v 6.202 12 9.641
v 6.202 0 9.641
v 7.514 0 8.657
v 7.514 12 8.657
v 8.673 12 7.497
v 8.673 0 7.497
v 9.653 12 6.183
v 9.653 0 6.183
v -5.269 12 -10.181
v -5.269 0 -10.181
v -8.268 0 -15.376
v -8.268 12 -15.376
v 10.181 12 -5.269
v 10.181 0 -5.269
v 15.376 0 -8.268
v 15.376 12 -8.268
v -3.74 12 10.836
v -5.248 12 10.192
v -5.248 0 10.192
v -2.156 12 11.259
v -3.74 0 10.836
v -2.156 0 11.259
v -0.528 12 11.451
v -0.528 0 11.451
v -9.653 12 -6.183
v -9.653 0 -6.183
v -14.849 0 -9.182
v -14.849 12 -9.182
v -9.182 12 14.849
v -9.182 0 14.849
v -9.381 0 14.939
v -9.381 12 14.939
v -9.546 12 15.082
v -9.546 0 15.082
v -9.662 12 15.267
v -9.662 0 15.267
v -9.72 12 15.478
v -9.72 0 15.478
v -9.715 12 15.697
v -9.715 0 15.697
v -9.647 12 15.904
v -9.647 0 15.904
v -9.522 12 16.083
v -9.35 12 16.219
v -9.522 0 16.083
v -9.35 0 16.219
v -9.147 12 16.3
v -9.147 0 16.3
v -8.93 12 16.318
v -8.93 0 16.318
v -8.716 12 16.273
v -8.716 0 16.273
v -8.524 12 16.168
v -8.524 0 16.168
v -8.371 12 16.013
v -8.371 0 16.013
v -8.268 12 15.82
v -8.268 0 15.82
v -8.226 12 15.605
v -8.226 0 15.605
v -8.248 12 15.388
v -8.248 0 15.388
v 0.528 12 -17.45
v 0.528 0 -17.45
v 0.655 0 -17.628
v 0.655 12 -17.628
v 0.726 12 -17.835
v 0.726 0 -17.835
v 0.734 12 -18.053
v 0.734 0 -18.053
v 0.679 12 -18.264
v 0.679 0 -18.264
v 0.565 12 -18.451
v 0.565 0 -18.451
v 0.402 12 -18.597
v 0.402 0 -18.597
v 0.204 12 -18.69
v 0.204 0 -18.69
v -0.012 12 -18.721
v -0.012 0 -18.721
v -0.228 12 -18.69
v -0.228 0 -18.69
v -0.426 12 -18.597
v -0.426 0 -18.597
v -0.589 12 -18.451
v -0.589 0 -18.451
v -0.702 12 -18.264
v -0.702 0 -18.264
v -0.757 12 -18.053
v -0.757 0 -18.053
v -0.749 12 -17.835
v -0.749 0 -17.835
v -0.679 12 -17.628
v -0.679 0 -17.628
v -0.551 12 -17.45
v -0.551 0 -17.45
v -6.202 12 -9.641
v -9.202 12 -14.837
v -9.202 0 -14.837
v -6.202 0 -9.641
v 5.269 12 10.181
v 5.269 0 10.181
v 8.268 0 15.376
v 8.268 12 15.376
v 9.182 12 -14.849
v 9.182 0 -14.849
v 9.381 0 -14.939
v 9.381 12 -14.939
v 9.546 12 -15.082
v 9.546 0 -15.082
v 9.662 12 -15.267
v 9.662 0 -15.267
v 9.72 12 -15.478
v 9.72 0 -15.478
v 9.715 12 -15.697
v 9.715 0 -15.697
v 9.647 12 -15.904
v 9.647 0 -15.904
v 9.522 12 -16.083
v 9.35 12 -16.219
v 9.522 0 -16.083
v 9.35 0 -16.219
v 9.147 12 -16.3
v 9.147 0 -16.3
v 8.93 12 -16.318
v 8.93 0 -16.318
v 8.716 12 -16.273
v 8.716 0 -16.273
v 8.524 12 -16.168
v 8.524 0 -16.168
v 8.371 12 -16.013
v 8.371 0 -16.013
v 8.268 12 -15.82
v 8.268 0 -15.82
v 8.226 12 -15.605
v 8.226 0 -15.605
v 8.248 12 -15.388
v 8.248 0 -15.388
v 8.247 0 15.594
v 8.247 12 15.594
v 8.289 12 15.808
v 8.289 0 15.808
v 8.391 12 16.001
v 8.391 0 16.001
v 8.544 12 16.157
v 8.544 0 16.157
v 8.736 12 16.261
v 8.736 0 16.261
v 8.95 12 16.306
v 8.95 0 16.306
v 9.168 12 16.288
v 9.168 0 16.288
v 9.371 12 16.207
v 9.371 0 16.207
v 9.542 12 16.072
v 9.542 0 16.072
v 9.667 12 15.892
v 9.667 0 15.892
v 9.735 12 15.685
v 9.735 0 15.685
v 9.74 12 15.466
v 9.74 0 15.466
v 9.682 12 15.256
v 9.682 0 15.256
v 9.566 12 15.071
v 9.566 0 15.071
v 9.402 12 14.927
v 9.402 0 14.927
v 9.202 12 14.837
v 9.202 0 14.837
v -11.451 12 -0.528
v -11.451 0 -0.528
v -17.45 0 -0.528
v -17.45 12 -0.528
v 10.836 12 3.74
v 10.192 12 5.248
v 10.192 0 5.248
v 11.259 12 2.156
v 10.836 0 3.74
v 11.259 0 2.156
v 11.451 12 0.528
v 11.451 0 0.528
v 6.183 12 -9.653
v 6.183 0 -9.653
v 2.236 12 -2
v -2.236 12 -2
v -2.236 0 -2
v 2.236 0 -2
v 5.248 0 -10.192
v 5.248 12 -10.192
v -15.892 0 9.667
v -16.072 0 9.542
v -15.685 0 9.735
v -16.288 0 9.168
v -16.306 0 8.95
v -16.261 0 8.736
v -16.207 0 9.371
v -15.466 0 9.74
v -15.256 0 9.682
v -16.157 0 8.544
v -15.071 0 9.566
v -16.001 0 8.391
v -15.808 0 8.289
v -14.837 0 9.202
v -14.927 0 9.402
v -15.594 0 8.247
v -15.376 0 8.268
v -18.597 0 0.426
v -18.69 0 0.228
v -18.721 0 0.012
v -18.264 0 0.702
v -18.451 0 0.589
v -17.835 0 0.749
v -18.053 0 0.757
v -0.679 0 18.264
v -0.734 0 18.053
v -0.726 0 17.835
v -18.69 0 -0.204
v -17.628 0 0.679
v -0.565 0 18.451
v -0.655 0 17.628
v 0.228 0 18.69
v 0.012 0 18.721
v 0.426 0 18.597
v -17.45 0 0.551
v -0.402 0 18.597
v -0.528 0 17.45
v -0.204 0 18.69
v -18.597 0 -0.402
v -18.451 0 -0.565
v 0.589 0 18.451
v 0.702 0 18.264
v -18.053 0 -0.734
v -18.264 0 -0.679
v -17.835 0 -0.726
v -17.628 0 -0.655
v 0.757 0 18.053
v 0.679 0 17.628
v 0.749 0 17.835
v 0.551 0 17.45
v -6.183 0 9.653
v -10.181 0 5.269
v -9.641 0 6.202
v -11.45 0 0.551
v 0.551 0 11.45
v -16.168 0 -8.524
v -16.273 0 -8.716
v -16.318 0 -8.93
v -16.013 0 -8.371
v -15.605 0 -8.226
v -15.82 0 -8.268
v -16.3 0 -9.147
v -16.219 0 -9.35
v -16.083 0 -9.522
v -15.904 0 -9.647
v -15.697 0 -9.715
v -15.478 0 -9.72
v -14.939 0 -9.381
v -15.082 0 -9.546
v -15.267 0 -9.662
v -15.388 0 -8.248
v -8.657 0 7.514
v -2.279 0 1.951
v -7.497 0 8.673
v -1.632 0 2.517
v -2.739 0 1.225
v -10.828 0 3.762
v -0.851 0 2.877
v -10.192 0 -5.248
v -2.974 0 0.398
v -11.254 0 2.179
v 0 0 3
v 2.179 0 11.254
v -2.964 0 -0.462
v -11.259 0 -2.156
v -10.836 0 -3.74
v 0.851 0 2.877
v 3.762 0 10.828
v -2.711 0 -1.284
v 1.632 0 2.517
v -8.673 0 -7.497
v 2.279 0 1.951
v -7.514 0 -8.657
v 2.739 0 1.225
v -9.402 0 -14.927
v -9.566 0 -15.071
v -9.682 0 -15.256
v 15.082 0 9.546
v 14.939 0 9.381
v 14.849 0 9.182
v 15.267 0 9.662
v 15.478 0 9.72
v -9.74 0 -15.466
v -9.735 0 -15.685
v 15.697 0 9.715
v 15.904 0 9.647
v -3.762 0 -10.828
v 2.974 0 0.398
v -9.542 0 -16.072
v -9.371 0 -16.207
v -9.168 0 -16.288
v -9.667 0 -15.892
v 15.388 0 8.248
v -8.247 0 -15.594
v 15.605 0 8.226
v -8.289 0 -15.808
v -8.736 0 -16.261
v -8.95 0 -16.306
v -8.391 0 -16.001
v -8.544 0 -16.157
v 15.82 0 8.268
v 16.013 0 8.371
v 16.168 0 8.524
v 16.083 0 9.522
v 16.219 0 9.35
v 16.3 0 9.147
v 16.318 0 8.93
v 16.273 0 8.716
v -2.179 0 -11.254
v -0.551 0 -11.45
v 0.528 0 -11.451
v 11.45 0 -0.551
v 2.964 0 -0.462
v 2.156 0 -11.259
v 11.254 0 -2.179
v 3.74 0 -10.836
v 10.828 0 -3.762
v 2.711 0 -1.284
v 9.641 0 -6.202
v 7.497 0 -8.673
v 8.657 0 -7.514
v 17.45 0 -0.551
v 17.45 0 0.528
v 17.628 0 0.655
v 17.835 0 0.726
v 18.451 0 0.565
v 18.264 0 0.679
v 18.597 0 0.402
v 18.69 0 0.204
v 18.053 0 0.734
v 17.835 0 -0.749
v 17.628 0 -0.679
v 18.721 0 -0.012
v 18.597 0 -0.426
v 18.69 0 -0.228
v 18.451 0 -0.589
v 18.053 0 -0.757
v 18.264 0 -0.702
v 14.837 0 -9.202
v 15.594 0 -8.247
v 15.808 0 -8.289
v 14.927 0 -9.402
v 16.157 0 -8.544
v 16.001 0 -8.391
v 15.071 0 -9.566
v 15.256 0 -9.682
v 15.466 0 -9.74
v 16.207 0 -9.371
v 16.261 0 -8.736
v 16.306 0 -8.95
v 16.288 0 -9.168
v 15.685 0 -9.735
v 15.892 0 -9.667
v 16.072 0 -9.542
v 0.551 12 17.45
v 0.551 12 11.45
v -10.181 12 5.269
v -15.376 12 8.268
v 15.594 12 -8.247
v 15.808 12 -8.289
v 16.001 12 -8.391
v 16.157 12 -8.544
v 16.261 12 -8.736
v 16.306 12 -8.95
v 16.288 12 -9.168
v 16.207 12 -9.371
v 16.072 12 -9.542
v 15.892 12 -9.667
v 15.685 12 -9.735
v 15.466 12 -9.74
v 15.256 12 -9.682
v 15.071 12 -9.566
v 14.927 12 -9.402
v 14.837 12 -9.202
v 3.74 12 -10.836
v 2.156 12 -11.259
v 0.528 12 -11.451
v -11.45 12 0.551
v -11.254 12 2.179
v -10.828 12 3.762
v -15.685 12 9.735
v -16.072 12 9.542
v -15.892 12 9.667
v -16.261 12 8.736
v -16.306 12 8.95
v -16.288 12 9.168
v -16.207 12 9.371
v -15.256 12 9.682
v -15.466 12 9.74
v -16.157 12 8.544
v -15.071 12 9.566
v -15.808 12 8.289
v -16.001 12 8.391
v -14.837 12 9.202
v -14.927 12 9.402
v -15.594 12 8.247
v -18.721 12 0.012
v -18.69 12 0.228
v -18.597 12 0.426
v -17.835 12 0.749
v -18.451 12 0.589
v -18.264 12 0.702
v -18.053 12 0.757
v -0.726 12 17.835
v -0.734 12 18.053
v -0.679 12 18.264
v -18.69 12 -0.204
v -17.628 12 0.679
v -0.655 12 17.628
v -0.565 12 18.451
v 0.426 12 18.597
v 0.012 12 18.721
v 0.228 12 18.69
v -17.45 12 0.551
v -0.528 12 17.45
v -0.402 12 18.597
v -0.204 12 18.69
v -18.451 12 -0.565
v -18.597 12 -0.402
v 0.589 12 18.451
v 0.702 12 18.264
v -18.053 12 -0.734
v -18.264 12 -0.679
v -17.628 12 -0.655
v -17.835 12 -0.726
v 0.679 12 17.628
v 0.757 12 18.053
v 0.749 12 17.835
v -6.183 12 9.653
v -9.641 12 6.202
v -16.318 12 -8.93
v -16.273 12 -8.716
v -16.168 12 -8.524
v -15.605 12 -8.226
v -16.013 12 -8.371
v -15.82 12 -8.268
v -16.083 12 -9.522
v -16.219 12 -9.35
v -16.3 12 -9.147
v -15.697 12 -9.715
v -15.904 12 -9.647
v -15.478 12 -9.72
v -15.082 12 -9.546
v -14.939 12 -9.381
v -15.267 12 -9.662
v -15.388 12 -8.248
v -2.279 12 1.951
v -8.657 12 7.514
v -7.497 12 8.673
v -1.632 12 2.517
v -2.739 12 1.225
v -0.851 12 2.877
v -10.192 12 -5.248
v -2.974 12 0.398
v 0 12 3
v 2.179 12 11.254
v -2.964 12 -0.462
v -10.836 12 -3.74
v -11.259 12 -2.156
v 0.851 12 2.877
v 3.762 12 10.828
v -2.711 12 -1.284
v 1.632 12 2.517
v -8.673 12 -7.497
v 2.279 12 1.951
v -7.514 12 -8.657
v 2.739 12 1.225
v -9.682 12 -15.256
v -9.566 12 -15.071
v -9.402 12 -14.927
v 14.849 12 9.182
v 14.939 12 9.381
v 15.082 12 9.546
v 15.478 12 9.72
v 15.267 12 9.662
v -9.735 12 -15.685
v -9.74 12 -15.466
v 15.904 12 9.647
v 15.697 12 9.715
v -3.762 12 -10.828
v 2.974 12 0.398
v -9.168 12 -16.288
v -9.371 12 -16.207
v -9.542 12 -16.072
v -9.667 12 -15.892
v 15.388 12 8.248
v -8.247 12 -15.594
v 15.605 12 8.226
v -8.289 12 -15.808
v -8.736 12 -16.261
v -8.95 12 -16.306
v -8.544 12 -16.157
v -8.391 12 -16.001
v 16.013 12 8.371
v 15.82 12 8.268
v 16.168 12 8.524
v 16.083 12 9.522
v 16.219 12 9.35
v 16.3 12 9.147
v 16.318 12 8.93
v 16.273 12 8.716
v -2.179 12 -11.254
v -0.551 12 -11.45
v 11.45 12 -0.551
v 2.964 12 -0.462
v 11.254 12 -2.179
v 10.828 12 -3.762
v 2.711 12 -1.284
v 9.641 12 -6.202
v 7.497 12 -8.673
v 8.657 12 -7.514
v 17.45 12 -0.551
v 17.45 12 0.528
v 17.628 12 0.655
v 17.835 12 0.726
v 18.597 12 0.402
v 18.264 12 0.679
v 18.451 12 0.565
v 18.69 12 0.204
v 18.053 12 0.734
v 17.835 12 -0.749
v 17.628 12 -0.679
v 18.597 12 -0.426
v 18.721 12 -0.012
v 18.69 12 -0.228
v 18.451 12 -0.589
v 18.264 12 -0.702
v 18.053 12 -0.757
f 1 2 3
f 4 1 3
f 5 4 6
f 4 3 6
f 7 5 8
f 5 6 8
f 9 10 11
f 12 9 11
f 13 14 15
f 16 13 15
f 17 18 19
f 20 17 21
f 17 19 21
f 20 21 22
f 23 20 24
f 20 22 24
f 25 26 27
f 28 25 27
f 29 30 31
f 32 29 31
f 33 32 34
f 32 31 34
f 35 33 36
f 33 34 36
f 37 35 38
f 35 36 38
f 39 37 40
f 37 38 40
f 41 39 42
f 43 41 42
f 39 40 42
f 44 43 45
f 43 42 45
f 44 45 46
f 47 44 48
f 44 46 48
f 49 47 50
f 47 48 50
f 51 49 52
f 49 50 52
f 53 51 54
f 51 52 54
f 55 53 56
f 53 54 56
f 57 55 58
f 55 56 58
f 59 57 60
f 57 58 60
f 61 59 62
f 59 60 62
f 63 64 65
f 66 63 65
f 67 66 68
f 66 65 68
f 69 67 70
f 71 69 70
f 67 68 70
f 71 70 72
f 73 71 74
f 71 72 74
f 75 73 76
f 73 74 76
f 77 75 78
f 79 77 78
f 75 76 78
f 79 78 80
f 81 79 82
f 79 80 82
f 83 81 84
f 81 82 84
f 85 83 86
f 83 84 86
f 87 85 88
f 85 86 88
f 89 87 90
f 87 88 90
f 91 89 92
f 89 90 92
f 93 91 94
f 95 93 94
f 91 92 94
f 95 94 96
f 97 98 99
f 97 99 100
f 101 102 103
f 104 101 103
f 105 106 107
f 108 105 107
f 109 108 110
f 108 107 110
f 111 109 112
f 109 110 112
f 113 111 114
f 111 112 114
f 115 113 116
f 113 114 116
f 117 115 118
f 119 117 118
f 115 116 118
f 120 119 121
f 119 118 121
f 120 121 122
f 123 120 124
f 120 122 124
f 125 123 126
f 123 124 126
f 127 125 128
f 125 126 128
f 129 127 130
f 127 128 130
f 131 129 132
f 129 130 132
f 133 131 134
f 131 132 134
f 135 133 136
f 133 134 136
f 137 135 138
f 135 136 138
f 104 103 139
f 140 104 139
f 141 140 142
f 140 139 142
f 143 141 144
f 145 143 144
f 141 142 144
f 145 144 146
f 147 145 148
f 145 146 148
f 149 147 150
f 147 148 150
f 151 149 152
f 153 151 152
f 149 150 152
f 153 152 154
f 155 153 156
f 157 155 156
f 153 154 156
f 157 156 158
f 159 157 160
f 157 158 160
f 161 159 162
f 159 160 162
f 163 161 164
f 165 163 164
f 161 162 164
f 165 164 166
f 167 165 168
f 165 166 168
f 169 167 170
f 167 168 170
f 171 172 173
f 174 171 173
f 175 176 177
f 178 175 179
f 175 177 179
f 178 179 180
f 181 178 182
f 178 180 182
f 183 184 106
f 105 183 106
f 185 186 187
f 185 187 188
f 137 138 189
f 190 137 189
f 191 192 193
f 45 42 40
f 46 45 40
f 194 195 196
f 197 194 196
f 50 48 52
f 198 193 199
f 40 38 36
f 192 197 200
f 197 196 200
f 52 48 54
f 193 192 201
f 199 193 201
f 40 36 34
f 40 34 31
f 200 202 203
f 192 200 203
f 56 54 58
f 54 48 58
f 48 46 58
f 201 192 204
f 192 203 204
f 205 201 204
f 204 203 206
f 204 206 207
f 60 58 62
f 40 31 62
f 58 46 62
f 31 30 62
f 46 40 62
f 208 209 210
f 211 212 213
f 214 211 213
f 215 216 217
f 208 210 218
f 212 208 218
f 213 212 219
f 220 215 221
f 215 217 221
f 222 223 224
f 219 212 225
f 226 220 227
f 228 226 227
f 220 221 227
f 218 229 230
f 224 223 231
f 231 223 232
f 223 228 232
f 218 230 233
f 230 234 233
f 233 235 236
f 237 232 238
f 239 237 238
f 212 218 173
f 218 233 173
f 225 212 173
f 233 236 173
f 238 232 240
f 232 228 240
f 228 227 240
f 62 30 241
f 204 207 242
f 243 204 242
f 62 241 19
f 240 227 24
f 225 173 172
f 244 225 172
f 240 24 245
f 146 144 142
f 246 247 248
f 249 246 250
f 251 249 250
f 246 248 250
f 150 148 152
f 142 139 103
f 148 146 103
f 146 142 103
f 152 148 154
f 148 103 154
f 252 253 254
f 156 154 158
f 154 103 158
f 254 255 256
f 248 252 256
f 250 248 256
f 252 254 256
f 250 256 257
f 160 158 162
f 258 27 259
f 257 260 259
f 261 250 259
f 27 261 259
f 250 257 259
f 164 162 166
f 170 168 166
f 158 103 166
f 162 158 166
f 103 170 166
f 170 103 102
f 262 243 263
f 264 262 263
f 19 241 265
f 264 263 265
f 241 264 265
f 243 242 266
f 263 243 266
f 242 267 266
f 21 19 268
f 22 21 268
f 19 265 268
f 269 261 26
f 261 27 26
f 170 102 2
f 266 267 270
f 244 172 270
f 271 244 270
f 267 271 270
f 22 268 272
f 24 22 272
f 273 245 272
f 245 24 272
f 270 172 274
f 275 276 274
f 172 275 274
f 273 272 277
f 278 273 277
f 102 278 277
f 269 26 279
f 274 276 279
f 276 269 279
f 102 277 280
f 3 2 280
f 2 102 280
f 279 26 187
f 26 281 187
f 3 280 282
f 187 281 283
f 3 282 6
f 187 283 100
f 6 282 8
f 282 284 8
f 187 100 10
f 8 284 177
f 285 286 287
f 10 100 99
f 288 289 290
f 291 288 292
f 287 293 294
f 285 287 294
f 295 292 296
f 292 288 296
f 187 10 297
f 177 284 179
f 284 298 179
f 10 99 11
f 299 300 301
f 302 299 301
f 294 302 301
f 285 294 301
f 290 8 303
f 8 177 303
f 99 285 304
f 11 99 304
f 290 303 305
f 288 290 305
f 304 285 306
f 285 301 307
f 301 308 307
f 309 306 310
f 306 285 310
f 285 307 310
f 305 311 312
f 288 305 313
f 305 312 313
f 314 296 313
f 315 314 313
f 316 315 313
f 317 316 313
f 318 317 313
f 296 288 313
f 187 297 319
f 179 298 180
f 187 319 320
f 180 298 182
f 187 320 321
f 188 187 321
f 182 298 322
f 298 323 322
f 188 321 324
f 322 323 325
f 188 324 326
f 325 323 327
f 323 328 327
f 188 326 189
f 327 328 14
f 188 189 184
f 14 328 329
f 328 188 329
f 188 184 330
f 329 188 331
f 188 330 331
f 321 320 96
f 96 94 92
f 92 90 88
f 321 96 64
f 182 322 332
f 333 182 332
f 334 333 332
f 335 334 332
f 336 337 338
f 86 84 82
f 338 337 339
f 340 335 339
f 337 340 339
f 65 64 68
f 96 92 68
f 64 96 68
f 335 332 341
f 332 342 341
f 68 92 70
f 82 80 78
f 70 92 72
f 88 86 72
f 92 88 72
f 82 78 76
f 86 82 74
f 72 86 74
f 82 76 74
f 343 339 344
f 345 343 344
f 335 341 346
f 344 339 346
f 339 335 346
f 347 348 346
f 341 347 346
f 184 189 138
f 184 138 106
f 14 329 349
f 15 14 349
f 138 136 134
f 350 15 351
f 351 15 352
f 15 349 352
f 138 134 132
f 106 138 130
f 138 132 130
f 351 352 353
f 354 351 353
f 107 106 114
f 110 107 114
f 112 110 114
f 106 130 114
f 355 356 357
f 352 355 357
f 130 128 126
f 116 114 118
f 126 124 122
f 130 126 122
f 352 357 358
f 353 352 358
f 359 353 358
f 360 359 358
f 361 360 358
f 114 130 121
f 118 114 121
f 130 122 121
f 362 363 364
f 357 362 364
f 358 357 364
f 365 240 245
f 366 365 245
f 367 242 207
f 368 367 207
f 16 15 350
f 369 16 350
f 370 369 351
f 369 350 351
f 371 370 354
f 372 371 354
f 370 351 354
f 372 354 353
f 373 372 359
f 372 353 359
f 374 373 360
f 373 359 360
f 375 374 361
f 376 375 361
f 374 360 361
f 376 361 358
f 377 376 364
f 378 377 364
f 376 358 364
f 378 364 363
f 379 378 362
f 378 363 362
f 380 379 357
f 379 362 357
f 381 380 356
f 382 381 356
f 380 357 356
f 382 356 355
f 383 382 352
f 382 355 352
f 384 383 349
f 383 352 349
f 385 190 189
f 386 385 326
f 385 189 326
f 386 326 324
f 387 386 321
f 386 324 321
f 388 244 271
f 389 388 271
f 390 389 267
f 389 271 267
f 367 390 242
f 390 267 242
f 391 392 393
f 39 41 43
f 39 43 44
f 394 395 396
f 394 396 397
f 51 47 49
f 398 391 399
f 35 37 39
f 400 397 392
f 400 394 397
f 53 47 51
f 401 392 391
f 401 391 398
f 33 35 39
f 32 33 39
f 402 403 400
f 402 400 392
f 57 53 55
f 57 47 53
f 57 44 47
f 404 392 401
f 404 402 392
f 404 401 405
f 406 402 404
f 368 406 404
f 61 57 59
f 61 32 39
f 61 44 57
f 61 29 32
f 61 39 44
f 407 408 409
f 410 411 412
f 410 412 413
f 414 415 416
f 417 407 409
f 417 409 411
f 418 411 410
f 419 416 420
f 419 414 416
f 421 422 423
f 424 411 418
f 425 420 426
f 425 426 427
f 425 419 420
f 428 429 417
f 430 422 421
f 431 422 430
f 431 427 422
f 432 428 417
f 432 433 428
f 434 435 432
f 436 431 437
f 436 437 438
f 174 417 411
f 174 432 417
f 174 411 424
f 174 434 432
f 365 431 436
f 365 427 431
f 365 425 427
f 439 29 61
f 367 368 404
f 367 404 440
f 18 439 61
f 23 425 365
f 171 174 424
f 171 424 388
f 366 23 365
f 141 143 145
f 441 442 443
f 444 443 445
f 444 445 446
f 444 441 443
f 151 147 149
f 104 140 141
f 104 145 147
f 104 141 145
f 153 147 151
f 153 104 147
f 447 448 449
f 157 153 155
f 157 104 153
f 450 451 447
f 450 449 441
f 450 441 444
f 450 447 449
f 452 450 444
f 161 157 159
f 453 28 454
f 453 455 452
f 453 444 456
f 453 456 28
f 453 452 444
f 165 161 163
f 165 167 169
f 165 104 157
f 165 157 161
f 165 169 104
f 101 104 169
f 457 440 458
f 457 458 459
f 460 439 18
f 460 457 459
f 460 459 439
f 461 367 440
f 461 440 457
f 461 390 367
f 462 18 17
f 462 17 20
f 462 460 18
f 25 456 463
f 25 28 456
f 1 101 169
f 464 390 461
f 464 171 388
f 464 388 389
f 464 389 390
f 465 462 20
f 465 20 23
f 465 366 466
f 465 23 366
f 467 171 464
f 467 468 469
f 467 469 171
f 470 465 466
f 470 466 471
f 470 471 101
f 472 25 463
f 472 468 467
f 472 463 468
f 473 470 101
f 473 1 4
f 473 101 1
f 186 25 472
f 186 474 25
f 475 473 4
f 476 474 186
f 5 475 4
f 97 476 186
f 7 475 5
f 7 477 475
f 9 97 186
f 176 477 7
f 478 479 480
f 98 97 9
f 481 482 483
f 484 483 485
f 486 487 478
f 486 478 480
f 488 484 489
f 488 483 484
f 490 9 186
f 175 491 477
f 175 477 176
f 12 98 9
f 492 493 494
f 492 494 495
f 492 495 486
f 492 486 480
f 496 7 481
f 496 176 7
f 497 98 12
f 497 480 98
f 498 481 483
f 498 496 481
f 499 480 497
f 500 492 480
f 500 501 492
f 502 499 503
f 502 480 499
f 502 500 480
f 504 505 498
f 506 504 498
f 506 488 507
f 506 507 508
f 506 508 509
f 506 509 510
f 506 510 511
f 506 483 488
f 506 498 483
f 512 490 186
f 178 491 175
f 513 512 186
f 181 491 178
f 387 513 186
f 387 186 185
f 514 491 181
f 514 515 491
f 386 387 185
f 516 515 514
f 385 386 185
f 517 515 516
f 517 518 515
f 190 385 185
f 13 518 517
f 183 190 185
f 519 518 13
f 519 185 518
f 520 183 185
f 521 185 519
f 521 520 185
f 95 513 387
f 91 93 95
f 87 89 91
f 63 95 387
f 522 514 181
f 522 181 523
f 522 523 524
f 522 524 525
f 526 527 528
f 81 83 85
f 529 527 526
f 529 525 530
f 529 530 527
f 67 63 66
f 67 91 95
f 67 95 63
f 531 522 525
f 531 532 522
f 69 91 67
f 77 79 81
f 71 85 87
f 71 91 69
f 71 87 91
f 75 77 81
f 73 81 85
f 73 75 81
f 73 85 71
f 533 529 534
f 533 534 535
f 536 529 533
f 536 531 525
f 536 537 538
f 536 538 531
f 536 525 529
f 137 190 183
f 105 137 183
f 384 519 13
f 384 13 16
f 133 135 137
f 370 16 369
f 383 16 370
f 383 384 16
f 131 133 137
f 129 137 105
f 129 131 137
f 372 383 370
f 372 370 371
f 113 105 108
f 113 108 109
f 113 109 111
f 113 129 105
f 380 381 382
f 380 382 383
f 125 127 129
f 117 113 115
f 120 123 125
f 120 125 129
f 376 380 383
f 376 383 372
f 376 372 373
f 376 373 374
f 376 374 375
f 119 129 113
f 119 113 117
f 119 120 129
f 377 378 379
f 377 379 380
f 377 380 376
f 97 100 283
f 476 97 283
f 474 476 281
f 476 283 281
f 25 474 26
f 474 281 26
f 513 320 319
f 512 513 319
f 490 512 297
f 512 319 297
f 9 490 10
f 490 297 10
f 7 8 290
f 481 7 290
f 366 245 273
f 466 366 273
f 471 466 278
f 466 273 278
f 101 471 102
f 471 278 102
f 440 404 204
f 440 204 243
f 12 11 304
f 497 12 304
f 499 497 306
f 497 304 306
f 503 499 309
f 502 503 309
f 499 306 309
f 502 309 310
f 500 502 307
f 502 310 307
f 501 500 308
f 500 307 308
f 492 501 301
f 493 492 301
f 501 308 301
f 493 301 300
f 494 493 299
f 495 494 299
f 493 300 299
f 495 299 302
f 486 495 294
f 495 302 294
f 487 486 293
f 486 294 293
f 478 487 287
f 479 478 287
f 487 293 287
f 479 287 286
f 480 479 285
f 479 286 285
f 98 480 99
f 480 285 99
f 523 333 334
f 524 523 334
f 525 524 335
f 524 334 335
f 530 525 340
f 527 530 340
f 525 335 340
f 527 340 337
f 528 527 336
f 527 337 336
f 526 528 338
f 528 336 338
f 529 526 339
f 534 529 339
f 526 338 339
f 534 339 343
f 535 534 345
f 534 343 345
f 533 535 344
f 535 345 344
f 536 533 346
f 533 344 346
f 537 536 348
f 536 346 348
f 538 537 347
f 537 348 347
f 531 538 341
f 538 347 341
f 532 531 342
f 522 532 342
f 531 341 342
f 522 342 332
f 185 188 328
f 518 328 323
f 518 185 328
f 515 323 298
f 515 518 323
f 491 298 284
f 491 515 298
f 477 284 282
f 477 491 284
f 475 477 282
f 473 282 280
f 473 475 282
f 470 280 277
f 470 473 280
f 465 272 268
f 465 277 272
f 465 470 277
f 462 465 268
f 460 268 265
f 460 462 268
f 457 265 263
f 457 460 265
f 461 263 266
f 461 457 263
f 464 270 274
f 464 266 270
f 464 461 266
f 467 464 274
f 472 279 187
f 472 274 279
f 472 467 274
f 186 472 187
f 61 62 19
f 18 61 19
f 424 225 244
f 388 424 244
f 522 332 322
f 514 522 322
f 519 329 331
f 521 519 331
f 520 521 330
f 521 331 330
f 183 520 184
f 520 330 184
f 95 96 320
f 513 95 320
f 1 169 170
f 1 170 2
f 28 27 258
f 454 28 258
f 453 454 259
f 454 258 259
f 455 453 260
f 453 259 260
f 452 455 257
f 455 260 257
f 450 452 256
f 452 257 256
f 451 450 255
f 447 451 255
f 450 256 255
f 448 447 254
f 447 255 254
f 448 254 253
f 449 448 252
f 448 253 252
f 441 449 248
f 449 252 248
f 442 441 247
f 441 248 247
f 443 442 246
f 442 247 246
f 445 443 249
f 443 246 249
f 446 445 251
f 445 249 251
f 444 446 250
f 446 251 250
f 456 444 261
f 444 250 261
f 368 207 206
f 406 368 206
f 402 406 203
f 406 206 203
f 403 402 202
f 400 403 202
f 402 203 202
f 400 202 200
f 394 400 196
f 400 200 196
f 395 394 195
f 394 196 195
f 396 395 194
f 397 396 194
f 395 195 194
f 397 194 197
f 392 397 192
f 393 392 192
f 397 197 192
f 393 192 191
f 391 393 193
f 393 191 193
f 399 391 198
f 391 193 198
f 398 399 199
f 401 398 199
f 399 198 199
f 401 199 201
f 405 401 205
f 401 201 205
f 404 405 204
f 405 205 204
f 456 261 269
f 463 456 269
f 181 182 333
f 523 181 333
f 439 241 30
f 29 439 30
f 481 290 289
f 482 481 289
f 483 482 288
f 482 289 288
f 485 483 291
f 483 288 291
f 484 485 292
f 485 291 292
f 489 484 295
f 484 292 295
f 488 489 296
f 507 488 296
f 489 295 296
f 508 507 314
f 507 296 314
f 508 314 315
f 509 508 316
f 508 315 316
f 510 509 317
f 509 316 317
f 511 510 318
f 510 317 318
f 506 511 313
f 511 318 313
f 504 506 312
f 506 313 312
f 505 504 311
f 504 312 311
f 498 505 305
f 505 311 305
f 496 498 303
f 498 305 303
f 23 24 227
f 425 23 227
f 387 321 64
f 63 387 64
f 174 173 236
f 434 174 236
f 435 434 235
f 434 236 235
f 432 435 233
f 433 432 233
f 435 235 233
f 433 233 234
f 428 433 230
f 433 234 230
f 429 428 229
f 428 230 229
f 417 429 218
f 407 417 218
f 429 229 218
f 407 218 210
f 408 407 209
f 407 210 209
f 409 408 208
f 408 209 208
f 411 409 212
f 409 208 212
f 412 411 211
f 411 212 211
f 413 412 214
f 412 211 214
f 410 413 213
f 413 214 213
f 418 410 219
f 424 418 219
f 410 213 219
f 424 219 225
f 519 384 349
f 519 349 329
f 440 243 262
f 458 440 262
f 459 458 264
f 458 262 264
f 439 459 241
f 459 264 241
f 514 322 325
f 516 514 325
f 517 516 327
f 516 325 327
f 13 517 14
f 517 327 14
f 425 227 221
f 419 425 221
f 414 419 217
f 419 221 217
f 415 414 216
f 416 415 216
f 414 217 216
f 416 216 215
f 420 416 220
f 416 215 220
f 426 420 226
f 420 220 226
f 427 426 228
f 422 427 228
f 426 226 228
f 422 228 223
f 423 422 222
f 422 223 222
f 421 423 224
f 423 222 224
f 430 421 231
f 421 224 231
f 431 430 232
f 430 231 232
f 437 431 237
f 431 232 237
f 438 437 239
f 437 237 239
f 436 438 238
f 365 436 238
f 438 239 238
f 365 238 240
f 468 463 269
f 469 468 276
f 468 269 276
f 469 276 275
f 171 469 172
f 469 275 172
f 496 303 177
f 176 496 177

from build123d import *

# Parameters (mm, degrees)
BOSS_EXTRUDE1_DEPTH = 12
CUT_EXTRUDE1_DEPTH  = 13


with BuildPart() as part:
    # Sketch1 → Boss-Extrude1 (new body)
    with BuildSketch(Plane(origin=(0, 0, 0), x_dir=(1, 0, 0), z_dir=(0, 1, 0))):
        with BuildLine():
            Line((-0.551192068, 17.450239661), (-0.551192068, 11.450239661))
            ThreePointArc((-0.551192068, 11.450239661), (-2.978402467, 11.069820222), (-5.268807469, 10.180936541))
            Line((-5.268807469, 10.180936541), (-8.268250593, 15.376124426))
            ThreePointArc((-8.268250593, 15.376124426), (-9.370925272, 16.20727377), (-9.202466164, 14.836754815))
            Line((-9.202466164, 14.836754815), (-6.202466164, 9.640602392))
            ThreePointArc((-6.202466164, 9.640602392), (-8.11428231, 8.097544294), (-9.653389387, 6.182545944))
            Line((-9.653389387, 6.182545944), (-14.848577272, 9.181989068))
            ThreePointArc((-14.848577272, 9.181989068), (-16.219096227, 9.350448175), (-15.387946883, 8.247773497))
            Line((-15.387946883, 8.247773497), (-10.19179446, 5.247773497))
            ThreePointArc((-10.19179446, 5.247773497), (-11.075946761, 2.955537911), (-11.451353414, 0.527547154))
            Line((-11.451353414, 0.527547154), (-17.450239661, 0.527547154))
            ThreePointArc((-17.450239661, 0.527547154), (-18.721373447, -0.011822457), (-17.450239661, -0.551192068))
            Line((-17.450239661, -0.551192068), (-11.450239661, -0.551192068))
            ThreePointArc((-11.450239661, -0.551192068), (-11.069820222, -2.978402467), (-10.180936541, -5.268807469))
            Line((-10.180936541, -5.268807469), (-15.376124426, -8.268250593))
            ThreePointArc((-15.376124426, -8.268250593), (-16.20727377, -9.370925272), (-14.836754815, -9.202466164))
            Line((-14.836754815, -9.202466164), (-9.640602392, -6.202466164))
            ThreePointArc((-9.640602392, -6.202466164), (-8.097544294, -8.11428231), (-6.182545944, -9.653389387))
            Line((-6.182545944, -9.653389387), (-9.181989068, -14.848577272))
            ThreePointArc((-9.181989068, -14.848577272), (-9.350448175, -16.219096227), (-8.247773497, -15.387946883))
            Line((-8.247773497, -15.387946883), (-5.247773497, -10.19179446))
            ThreePointArc((-5.247773497, -10.19179446), (-2.955537911, -11.075946761), (-0.527547154, -11.451353414))
            Line((-0.527547154, -11.451353414), (-0.527547154, -17.450239661))
            ThreePointArc((-0.527547154, -17.450239661), (0.011822457, -18.721373447), (0.551192068, -17.450239661))
            Line((0.551192068, -17.450239661), (0.551192068, -11.450239661))
            ThreePointArc((0.551192068, -11.450239661), (2.978402467, -11.069820222), (5.268807469, -10.180936541))
            Line((5.268807469, -10.180936541), (8.268250593, -15.376124426))
            ThreePointArc((8.268250593, -15.376124426), (9.370925272, -16.20727377), (9.202466164, -14.836754815))
            Line((9.202466164, -14.836754815), (6.202466164, -9.640602392))
            ThreePointArc((6.202466164, -9.640602392), (8.11428231, -8.097544294), (9.653389387, -6.182545944))
            Line((9.653389387, -6.182545944), (14.848577272, -9.181989068))
            ThreePointArc((14.848577272, -9.181989068), (16.219096227, -9.350448175), (15.387946883, -8.247773497))
            Line((15.387946883, -8.247773497), (10.19179446, -5.247773497))
            ThreePointArc((10.19179446, -5.247773497), (11.075946761, -2.955537911), (11.451353414, -0.527547154))
            Line((11.451353414, -0.527547154), (17.450239661, -0.527547154))
            ThreePointArc((17.450239661, -0.527547154), (18.721373447, 0.011822457), (17.450239661, 0.551192068))
            Line((17.450239661, 0.551192068), (11.450239661, 0.551192068))
            ThreePointArc((11.450239661, 0.551192068), (11.069820222, 2.978402467), (10.180936541, 5.268807469))
            Line((10.180936541, 5.268807469), (15.376124426, 8.268250593))
            ThreePointArc((15.376124426, 8.268250593), (16.20727377, 9.370925272), (14.836754815, 9.202466164))
            Line((14.836754815, 9.202466164), (9.640602392, 6.202466164))
            ThreePointArc((9.640602392, 6.202466164), (8.097544294, 8.11428231), (6.182545944, 9.653389387))
            Line((6.182545944, 9.653389387), (9.181989068, 14.848577272))
            ThreePointArc((9.181989068, 14.848577272), (9.350448175, 16.219096227), (8.247773497, 15.387946883))
            Line((8.247773497, 15.387946883), (5.247773497, 10.19179446))
            ThreePointArc((5.247773497, 10.19179446), (2.955537911, 11.075946761), (0.527547154, 11.451353414))
            Line((0.527547154, 11.451353414), (0.527547154, 17.450239661))
            ThreePointArc((0.527547154, 17.450239661), (-0.011822457, 18.721373447), (-0.551192068, 17.450239661))
        make_face()
    extrude(amount=BOSS_EXTRUDE1_DEPTH)

    # Sketch2 → Cut-Extrude1 (cut, through all)
    with BuildSketch(Plane(origin=(0, 12, 0), x_dir=(1, 0, 0), z_dir=(0, 1, 0))):
        with BuildLine():
            Line((-2.236067977, 2), (2.236067977, 2))
            ThreePointArc((2.236067977, 2), (0, -3), (-2.236067977, 2))
        make_face()
    extrude(amount=-CUT_EXTRUDE1_DEPTH, mode=Mode.SUBTRACT)


solid = part.part
